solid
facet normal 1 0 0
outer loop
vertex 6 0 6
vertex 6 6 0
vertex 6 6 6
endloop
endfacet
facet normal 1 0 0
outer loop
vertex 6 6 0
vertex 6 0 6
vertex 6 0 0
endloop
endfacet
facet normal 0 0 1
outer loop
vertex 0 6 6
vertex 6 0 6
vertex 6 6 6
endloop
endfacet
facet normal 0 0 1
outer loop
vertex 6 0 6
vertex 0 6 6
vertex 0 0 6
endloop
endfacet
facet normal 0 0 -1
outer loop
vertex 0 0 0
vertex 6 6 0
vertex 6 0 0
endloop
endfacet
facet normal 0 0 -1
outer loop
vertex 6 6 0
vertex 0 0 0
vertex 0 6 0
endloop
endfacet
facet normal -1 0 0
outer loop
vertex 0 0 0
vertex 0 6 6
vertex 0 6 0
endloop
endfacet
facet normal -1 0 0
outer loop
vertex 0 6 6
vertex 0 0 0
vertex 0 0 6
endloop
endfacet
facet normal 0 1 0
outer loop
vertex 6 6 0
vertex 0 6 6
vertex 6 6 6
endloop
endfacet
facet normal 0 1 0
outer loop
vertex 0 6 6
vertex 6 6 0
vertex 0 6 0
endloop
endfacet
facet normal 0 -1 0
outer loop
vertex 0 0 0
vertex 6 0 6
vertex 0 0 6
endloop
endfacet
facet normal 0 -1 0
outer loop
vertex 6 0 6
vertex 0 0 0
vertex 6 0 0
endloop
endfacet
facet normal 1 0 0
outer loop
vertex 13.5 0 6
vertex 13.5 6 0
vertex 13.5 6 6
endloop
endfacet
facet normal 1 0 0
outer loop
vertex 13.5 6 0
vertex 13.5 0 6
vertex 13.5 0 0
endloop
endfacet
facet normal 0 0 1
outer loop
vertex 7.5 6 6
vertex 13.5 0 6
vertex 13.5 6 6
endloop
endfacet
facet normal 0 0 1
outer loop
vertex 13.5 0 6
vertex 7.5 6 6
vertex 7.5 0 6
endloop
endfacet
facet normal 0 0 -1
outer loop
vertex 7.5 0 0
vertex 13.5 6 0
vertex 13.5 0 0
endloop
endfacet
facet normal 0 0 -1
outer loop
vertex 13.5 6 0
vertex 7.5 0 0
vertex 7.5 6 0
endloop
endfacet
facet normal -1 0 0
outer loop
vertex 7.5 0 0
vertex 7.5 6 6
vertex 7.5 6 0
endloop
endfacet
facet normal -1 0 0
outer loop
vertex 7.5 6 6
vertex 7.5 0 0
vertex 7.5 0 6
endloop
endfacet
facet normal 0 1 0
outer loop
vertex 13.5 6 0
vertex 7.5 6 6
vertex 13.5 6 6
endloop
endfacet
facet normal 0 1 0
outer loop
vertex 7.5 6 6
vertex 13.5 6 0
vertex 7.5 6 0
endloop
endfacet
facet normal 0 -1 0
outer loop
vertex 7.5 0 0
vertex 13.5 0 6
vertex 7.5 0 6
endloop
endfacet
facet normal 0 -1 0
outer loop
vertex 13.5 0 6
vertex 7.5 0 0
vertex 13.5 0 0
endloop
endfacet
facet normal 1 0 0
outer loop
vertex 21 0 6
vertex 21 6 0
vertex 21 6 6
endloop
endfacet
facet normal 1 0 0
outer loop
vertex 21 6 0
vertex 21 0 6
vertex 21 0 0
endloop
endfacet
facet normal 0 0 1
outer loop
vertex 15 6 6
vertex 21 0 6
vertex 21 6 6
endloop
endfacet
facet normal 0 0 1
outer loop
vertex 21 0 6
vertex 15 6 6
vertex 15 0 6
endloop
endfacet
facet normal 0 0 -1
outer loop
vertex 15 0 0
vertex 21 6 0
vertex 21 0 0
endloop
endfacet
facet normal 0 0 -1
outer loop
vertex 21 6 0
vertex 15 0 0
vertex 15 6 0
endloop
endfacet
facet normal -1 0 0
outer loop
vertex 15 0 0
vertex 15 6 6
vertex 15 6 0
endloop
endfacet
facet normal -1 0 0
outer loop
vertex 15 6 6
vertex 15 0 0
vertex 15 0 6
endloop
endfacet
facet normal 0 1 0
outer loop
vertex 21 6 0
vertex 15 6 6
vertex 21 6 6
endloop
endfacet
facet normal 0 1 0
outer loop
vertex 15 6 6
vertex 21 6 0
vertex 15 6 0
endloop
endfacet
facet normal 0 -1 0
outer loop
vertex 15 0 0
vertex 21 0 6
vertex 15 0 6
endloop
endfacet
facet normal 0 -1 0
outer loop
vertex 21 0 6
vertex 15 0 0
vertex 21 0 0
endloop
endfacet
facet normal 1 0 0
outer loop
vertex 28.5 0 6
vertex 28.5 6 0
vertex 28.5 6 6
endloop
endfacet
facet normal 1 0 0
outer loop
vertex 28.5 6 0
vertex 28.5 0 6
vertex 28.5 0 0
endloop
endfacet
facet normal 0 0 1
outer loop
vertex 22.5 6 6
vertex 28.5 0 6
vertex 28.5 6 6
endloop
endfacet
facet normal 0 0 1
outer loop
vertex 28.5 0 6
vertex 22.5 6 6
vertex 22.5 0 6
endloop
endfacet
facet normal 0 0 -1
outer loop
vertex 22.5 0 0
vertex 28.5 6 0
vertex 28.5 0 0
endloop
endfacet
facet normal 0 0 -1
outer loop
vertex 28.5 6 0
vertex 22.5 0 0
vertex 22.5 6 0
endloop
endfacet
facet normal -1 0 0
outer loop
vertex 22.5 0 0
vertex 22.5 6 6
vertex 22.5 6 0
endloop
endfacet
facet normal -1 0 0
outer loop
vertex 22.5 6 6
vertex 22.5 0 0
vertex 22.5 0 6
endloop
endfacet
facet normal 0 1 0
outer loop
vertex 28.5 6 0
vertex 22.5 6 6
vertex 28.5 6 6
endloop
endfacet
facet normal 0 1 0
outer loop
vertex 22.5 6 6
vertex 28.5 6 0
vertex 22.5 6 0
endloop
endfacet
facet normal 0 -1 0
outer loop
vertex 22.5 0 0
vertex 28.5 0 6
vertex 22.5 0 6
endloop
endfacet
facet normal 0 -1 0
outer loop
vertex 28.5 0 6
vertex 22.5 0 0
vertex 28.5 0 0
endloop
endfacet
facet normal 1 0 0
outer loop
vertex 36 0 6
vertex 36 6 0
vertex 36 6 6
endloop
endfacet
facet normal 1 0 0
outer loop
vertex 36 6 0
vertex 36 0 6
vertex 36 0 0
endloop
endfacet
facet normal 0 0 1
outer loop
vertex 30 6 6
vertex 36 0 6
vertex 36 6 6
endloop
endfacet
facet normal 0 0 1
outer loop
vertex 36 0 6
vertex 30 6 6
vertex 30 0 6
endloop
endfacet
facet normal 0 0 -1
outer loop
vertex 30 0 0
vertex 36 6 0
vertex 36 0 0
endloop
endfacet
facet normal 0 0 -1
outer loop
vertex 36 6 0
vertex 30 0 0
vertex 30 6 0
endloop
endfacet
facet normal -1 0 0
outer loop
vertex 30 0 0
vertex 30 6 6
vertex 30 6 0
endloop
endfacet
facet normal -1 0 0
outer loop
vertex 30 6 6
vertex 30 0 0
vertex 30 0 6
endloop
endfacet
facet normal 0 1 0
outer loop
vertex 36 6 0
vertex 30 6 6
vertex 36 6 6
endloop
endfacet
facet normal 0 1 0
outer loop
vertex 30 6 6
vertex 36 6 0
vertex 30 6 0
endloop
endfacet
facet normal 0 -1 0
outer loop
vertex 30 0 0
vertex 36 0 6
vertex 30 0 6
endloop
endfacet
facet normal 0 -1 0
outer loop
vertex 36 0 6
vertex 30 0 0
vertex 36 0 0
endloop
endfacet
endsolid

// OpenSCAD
// a fractional step: the range must produce the same iteration count on both sides
union() {
  for (x = [0 : 2.5 : 10]) translate([x * 3, 0, 0]) cube([6, 6, 6]);
}
